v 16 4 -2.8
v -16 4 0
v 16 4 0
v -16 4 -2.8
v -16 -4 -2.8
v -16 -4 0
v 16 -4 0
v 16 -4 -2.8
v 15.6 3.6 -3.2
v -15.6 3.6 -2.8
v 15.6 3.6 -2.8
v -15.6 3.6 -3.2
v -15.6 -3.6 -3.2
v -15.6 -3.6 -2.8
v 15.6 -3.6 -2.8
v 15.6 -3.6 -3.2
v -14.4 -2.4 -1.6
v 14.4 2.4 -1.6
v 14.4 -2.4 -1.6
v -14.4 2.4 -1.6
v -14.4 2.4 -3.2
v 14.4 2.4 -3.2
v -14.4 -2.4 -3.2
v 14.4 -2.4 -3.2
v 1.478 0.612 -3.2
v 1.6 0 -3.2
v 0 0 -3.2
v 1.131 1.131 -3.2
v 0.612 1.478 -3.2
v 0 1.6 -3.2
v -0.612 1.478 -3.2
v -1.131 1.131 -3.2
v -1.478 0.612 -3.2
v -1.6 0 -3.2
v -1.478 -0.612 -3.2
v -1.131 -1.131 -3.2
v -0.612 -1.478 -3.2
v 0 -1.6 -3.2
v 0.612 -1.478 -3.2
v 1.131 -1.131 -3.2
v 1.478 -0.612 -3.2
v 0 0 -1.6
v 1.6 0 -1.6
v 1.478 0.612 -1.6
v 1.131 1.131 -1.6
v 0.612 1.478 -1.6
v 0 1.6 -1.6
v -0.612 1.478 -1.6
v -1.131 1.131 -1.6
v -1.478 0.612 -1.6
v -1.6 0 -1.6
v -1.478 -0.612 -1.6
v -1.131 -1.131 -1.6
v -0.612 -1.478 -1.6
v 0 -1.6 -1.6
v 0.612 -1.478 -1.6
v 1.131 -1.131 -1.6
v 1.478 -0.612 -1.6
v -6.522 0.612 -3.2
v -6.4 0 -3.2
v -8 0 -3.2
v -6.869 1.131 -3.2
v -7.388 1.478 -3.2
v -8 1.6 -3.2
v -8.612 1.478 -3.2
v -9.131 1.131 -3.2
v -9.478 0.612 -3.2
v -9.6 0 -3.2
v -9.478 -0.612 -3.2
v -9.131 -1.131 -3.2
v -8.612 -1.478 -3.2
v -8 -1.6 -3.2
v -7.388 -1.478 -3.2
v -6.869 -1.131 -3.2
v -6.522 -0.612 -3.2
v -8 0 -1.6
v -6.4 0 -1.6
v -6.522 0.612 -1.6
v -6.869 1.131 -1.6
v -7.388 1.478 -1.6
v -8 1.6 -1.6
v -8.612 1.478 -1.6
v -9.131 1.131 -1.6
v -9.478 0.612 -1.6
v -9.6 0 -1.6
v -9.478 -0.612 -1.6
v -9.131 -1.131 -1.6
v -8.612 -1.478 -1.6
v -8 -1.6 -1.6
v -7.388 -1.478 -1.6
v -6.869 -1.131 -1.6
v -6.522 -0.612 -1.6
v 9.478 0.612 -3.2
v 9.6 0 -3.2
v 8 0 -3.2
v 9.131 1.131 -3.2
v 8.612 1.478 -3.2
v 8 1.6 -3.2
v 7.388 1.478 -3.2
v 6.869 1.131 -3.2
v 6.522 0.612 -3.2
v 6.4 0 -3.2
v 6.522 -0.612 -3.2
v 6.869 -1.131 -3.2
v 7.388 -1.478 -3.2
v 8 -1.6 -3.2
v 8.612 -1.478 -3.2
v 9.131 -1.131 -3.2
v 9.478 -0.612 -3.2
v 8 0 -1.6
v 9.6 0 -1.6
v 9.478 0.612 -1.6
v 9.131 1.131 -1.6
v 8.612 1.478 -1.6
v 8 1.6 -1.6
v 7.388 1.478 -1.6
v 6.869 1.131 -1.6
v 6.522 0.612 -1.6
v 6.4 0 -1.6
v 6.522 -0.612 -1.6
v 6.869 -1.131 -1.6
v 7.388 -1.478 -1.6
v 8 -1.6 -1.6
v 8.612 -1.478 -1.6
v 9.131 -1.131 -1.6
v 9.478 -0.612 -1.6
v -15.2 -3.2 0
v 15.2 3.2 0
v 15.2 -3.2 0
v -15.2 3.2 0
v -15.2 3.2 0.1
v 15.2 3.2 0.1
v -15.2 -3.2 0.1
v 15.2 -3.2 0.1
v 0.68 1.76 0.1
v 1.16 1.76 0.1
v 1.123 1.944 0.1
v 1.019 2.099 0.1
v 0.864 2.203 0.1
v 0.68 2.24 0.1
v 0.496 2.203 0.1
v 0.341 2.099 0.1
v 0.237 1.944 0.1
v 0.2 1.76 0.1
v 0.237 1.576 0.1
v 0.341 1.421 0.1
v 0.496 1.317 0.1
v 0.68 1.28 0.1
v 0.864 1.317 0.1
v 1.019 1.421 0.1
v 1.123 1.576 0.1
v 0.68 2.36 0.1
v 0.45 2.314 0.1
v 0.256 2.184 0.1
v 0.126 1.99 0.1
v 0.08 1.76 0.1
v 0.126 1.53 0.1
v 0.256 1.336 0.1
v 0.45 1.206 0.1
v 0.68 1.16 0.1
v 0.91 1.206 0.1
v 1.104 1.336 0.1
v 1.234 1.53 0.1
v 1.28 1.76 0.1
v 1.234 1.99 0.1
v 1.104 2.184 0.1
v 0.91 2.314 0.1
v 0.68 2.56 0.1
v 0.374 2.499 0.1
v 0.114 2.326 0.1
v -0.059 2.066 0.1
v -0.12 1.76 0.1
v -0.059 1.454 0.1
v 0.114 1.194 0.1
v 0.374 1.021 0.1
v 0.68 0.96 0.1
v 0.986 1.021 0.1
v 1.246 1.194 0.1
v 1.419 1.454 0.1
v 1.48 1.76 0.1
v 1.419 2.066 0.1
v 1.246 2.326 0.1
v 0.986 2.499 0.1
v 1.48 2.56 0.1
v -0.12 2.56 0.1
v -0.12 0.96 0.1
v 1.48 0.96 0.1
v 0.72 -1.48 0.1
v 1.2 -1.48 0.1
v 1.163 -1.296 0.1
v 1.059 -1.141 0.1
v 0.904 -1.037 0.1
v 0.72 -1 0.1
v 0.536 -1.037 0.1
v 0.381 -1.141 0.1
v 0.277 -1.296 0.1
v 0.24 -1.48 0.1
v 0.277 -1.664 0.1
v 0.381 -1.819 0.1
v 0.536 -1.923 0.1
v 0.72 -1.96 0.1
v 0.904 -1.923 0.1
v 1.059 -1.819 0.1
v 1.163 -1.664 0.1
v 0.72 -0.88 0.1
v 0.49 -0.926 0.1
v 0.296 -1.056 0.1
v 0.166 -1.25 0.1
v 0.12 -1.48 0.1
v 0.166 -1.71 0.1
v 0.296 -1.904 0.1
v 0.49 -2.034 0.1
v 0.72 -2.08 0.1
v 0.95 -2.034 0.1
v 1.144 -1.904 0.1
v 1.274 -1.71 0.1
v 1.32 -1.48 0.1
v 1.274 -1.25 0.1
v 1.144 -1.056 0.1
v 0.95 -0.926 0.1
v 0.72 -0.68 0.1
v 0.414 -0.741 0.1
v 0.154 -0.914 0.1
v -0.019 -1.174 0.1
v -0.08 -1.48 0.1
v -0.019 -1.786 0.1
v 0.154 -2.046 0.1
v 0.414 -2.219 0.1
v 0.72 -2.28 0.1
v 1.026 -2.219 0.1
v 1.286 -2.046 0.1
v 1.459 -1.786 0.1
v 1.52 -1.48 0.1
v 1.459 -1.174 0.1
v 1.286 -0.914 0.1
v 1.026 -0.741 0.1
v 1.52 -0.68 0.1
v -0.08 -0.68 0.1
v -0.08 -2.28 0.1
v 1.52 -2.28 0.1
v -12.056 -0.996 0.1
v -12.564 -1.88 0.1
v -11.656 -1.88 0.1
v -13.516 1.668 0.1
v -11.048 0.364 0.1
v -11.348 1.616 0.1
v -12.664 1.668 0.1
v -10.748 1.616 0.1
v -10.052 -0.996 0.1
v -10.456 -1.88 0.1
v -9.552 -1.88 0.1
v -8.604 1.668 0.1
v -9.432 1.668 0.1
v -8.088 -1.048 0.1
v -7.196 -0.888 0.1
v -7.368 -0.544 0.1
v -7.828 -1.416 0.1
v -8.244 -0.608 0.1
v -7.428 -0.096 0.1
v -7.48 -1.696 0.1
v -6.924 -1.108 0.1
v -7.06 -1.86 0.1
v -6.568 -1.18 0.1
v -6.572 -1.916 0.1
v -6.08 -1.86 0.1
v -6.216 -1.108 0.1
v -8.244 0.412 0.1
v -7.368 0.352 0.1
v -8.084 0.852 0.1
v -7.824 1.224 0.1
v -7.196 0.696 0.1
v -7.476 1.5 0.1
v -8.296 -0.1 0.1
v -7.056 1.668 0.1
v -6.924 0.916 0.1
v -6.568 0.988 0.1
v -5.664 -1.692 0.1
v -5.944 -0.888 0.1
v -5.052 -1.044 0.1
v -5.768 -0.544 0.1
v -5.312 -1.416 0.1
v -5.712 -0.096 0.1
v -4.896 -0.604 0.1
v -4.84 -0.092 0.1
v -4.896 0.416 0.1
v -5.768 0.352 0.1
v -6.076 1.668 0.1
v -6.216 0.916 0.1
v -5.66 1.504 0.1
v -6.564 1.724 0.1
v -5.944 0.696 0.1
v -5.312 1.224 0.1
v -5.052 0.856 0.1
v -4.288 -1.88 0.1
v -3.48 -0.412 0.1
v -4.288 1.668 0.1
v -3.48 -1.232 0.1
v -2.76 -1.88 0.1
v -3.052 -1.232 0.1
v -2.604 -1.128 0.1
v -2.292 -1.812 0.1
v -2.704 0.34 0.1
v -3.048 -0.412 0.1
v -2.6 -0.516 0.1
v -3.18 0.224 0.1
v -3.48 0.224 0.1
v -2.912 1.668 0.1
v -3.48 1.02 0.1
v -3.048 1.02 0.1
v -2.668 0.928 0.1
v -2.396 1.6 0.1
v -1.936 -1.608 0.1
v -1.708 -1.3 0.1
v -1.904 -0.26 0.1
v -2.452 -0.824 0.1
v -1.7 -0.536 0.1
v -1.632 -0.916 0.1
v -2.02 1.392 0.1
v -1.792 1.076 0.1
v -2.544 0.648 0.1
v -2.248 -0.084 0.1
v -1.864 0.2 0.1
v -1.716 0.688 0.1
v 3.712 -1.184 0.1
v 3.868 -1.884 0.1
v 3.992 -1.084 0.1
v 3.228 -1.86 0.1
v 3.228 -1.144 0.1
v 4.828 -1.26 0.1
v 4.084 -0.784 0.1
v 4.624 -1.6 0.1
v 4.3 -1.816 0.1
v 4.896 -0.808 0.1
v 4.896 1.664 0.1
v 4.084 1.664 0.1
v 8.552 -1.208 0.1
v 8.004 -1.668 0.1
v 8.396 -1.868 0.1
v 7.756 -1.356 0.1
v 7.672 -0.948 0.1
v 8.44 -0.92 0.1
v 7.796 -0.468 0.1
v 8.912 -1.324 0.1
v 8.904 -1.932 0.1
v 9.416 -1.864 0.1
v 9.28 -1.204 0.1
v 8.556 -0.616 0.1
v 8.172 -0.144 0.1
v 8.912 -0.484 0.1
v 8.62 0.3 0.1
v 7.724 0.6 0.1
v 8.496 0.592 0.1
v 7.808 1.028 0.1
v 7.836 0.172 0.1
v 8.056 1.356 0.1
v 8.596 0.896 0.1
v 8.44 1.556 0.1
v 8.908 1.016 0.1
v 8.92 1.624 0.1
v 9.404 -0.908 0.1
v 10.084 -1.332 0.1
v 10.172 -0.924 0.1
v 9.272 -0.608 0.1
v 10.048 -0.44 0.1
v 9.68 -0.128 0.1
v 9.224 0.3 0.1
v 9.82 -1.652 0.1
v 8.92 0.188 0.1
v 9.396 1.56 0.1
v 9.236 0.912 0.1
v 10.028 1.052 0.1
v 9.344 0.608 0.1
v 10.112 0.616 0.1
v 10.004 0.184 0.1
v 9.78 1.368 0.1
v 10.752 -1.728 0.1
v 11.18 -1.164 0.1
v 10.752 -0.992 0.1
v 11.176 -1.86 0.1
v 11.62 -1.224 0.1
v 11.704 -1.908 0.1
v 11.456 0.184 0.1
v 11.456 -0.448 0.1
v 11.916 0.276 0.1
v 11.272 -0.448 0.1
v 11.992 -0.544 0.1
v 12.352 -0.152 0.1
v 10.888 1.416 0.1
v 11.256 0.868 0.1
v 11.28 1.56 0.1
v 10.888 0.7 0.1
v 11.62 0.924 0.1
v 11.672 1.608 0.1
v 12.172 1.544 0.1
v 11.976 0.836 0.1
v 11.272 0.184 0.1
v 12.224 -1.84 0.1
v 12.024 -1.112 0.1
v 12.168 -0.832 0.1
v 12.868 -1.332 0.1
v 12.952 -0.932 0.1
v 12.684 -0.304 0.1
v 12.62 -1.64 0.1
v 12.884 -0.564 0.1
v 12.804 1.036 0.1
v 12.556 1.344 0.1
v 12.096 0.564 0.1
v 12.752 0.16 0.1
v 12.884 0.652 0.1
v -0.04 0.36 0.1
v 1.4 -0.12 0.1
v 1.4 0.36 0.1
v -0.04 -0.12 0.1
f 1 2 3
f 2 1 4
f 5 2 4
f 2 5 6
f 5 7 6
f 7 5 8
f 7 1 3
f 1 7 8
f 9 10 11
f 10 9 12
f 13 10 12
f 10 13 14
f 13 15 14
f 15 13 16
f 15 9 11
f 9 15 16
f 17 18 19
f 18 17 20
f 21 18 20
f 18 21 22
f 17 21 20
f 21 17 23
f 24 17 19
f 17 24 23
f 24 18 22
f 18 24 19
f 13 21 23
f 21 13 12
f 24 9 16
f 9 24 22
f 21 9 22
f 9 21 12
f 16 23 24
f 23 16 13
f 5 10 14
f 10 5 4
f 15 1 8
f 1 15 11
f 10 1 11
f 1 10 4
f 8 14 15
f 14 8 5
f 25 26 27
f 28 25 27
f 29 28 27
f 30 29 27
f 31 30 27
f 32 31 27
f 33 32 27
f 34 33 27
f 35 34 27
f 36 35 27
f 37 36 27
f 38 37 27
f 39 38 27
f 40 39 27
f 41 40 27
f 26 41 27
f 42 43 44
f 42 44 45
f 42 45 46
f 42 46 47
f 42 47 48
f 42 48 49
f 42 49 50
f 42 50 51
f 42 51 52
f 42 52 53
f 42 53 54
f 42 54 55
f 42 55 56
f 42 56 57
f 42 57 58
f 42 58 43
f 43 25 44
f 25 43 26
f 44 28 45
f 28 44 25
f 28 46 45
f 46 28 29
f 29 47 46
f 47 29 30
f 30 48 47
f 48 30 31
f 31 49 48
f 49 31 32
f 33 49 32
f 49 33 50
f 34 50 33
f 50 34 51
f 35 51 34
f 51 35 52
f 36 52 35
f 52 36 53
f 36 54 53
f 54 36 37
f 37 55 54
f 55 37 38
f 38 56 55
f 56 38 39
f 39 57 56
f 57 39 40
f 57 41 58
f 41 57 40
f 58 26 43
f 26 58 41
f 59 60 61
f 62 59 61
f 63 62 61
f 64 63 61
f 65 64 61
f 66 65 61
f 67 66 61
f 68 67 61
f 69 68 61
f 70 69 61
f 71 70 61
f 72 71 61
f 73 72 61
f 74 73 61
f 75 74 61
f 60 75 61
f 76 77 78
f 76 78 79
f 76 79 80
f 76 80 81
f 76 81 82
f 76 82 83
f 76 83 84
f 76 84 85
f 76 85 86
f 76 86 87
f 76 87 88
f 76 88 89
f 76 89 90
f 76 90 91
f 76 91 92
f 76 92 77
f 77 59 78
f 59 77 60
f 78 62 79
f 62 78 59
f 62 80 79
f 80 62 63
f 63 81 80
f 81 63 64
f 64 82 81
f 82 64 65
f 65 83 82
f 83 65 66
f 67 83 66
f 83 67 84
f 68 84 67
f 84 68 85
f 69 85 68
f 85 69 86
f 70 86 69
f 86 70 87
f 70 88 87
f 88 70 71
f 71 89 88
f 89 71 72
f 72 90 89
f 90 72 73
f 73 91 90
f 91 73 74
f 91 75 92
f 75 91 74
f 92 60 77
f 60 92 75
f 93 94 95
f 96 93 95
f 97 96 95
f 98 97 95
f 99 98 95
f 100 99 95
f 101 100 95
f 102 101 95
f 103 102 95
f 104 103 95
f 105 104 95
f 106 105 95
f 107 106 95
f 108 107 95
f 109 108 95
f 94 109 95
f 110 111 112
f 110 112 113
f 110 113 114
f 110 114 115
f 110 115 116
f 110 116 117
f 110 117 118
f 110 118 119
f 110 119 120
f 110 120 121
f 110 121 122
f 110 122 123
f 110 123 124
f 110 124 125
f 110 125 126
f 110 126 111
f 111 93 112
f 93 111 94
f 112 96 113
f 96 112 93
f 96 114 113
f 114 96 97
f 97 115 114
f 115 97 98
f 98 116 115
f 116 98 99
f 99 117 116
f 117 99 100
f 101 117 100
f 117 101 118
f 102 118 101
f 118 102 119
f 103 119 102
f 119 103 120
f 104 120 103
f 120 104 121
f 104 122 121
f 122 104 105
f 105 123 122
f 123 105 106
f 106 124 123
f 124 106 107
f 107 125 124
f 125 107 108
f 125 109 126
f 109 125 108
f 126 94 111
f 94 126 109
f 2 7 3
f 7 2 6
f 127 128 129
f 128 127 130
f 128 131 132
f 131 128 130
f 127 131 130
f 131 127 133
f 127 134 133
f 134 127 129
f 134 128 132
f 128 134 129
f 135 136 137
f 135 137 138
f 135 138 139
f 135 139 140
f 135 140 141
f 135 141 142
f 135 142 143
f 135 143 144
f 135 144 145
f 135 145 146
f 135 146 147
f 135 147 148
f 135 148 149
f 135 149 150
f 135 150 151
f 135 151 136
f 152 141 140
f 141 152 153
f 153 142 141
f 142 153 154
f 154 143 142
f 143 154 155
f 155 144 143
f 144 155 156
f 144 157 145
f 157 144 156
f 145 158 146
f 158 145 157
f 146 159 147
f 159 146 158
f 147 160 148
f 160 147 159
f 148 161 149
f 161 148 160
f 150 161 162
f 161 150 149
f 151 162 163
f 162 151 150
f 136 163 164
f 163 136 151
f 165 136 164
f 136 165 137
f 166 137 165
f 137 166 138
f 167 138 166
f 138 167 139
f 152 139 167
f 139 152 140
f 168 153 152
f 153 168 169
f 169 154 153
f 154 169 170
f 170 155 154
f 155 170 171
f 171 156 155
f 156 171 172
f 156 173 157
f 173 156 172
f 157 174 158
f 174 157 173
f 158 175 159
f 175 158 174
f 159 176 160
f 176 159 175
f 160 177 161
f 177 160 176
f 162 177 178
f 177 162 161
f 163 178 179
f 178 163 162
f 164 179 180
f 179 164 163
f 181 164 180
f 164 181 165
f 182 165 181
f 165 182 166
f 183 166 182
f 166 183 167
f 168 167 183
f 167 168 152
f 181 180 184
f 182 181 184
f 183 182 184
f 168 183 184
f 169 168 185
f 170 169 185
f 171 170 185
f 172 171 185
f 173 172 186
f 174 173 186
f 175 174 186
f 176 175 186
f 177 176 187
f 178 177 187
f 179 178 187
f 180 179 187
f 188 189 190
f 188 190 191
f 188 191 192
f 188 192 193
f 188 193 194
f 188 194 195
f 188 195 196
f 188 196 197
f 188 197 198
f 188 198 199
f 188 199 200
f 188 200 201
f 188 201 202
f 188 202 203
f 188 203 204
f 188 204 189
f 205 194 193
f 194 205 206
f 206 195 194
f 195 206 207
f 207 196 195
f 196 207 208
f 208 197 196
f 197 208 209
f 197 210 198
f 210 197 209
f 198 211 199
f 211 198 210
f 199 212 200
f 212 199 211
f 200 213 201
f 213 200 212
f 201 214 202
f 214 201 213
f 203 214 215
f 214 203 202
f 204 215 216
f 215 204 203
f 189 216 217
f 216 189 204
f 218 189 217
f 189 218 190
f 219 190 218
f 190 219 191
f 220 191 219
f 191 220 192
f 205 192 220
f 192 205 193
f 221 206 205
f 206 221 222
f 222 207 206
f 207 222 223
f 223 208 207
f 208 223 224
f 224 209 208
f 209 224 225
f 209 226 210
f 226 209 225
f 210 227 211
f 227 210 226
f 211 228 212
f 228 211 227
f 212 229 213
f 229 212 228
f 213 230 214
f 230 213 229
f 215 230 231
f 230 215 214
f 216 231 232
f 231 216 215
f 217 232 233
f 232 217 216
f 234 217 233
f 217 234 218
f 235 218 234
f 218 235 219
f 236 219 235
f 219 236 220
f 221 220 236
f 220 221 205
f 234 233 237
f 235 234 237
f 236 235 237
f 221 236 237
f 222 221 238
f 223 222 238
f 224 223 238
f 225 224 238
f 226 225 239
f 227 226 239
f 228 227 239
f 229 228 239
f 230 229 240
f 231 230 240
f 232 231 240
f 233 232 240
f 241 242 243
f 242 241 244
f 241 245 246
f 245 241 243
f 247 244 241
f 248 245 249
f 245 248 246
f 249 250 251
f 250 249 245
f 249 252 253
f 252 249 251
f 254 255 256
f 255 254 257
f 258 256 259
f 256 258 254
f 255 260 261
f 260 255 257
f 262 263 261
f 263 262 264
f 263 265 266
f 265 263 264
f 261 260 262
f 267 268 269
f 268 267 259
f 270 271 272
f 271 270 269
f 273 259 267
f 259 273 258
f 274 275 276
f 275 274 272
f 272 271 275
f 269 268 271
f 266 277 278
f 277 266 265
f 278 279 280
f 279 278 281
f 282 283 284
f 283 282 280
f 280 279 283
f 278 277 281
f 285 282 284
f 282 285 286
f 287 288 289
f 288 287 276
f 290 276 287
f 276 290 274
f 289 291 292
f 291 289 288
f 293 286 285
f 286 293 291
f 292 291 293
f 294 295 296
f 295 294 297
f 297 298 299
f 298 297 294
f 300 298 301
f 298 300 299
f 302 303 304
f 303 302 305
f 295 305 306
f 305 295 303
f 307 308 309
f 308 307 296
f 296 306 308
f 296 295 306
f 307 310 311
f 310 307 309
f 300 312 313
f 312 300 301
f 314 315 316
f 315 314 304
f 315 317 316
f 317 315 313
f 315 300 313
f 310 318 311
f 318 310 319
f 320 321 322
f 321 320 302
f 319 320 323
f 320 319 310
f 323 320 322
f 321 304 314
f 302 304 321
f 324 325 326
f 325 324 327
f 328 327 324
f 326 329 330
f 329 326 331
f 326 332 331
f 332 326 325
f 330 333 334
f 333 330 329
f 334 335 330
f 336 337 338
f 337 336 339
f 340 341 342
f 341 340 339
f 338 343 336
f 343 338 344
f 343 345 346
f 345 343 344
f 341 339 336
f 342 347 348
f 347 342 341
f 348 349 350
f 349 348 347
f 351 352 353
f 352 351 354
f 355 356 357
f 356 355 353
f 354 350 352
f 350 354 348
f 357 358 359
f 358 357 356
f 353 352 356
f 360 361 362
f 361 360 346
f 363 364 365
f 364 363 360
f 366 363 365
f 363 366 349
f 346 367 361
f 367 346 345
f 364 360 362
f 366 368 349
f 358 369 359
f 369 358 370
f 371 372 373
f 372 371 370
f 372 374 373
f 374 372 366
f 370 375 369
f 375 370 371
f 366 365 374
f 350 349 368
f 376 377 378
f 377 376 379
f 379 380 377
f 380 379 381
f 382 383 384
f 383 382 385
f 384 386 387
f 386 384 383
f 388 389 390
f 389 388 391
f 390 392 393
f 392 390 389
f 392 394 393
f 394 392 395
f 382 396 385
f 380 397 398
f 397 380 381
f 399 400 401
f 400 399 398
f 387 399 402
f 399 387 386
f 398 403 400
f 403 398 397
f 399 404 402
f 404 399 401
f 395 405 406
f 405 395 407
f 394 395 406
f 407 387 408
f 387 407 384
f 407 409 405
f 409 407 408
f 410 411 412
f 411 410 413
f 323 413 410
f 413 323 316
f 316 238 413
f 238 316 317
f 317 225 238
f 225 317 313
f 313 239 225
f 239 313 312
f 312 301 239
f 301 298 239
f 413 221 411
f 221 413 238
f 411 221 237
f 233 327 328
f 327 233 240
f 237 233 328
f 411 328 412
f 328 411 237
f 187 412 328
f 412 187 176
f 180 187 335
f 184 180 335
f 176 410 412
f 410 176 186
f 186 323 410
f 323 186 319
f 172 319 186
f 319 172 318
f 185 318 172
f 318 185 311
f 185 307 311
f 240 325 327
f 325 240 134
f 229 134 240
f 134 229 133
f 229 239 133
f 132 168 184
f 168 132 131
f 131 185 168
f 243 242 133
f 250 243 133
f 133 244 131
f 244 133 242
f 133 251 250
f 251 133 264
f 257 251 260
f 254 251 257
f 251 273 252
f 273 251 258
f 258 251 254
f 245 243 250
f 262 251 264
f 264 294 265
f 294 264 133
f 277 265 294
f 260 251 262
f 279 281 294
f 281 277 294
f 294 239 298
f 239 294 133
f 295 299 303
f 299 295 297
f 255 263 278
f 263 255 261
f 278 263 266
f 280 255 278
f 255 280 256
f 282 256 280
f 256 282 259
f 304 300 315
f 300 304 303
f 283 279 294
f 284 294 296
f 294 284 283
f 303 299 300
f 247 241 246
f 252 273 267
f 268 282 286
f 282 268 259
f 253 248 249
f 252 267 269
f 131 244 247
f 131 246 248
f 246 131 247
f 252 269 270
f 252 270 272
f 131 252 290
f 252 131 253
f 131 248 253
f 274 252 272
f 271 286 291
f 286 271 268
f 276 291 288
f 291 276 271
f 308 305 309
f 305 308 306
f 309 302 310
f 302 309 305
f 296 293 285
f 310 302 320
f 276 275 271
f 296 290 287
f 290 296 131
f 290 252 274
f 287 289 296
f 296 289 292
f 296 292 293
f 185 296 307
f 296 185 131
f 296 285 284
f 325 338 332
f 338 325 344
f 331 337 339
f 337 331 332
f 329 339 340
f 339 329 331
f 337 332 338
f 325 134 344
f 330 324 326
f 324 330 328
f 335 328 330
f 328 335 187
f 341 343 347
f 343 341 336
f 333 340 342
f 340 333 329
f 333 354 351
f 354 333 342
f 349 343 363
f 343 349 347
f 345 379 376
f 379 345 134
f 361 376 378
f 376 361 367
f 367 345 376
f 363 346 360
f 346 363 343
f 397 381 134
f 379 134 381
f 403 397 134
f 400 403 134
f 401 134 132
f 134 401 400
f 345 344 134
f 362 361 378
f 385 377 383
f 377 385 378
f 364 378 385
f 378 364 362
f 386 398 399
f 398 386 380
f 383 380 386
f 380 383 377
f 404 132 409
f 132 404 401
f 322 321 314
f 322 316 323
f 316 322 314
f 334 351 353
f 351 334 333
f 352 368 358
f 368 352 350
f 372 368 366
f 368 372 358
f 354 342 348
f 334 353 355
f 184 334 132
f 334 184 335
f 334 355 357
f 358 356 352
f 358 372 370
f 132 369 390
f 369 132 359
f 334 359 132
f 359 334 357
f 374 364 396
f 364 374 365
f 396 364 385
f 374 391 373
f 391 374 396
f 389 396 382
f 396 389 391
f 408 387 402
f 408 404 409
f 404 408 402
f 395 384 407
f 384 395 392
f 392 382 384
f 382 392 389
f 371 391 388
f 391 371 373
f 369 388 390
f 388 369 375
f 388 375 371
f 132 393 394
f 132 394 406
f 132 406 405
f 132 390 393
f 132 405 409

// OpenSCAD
use <../lib.scad>
use <2431.scad>
use <6153754j.scad>
function ldraw_lib__2431d14() = [
// 0 Tile  1 x  4 with Black "WOB - J 83" on Transparent Background Sticker
// 0 Name: 2431d14.dat
// 0 Author: Evert-Jan Boer [ejboer]
// 0 !LDRAW_ORG Shortcut UPDATE 2026-07
// 0 !LICENSE Licensed under CC BY 4.0 : see CAreadme.txt
// 
// 0 BFC CERTIFY CCW
  [0,"BFC","CERTIFY"],
  [0,"BFC","CCW"],
// 
// 0 !CATEGORY Sticker Shortcut
// 0 !KEYWORDS Bricklink 2431pb0720, set 10252, Volkswagen Beetle
// 
// 0 !HISTORY 2026-07-30 [OrionP] Official Update 2026-07
// 
// 1 16 0 0 0 1 0 0 0 1 0 0 0 1 2431.dat
  [1,16,0,0,0,1,0,0,0,1,0,0,0,1, ldraw_lib__2431()],
// 1 16 0 0 0 1 0 0 0 1 0 0 0 1 6153754j.dat
  [1,16,0,0,0,1,0,0,0,1,0,0,0,1, ldraw_lib__6153754j()],
];
module ldraw_lib__2431d14(step=0, col=false, unit=2/5, alt=false, line=0.2, solid=!$preview)
    makepoly(ldraw_lib__2431d14(), step=step, col=col, unit=unit, alt=alt, line=line, solid=solid);
ldraw_lib__2431d14(line=0.2);
